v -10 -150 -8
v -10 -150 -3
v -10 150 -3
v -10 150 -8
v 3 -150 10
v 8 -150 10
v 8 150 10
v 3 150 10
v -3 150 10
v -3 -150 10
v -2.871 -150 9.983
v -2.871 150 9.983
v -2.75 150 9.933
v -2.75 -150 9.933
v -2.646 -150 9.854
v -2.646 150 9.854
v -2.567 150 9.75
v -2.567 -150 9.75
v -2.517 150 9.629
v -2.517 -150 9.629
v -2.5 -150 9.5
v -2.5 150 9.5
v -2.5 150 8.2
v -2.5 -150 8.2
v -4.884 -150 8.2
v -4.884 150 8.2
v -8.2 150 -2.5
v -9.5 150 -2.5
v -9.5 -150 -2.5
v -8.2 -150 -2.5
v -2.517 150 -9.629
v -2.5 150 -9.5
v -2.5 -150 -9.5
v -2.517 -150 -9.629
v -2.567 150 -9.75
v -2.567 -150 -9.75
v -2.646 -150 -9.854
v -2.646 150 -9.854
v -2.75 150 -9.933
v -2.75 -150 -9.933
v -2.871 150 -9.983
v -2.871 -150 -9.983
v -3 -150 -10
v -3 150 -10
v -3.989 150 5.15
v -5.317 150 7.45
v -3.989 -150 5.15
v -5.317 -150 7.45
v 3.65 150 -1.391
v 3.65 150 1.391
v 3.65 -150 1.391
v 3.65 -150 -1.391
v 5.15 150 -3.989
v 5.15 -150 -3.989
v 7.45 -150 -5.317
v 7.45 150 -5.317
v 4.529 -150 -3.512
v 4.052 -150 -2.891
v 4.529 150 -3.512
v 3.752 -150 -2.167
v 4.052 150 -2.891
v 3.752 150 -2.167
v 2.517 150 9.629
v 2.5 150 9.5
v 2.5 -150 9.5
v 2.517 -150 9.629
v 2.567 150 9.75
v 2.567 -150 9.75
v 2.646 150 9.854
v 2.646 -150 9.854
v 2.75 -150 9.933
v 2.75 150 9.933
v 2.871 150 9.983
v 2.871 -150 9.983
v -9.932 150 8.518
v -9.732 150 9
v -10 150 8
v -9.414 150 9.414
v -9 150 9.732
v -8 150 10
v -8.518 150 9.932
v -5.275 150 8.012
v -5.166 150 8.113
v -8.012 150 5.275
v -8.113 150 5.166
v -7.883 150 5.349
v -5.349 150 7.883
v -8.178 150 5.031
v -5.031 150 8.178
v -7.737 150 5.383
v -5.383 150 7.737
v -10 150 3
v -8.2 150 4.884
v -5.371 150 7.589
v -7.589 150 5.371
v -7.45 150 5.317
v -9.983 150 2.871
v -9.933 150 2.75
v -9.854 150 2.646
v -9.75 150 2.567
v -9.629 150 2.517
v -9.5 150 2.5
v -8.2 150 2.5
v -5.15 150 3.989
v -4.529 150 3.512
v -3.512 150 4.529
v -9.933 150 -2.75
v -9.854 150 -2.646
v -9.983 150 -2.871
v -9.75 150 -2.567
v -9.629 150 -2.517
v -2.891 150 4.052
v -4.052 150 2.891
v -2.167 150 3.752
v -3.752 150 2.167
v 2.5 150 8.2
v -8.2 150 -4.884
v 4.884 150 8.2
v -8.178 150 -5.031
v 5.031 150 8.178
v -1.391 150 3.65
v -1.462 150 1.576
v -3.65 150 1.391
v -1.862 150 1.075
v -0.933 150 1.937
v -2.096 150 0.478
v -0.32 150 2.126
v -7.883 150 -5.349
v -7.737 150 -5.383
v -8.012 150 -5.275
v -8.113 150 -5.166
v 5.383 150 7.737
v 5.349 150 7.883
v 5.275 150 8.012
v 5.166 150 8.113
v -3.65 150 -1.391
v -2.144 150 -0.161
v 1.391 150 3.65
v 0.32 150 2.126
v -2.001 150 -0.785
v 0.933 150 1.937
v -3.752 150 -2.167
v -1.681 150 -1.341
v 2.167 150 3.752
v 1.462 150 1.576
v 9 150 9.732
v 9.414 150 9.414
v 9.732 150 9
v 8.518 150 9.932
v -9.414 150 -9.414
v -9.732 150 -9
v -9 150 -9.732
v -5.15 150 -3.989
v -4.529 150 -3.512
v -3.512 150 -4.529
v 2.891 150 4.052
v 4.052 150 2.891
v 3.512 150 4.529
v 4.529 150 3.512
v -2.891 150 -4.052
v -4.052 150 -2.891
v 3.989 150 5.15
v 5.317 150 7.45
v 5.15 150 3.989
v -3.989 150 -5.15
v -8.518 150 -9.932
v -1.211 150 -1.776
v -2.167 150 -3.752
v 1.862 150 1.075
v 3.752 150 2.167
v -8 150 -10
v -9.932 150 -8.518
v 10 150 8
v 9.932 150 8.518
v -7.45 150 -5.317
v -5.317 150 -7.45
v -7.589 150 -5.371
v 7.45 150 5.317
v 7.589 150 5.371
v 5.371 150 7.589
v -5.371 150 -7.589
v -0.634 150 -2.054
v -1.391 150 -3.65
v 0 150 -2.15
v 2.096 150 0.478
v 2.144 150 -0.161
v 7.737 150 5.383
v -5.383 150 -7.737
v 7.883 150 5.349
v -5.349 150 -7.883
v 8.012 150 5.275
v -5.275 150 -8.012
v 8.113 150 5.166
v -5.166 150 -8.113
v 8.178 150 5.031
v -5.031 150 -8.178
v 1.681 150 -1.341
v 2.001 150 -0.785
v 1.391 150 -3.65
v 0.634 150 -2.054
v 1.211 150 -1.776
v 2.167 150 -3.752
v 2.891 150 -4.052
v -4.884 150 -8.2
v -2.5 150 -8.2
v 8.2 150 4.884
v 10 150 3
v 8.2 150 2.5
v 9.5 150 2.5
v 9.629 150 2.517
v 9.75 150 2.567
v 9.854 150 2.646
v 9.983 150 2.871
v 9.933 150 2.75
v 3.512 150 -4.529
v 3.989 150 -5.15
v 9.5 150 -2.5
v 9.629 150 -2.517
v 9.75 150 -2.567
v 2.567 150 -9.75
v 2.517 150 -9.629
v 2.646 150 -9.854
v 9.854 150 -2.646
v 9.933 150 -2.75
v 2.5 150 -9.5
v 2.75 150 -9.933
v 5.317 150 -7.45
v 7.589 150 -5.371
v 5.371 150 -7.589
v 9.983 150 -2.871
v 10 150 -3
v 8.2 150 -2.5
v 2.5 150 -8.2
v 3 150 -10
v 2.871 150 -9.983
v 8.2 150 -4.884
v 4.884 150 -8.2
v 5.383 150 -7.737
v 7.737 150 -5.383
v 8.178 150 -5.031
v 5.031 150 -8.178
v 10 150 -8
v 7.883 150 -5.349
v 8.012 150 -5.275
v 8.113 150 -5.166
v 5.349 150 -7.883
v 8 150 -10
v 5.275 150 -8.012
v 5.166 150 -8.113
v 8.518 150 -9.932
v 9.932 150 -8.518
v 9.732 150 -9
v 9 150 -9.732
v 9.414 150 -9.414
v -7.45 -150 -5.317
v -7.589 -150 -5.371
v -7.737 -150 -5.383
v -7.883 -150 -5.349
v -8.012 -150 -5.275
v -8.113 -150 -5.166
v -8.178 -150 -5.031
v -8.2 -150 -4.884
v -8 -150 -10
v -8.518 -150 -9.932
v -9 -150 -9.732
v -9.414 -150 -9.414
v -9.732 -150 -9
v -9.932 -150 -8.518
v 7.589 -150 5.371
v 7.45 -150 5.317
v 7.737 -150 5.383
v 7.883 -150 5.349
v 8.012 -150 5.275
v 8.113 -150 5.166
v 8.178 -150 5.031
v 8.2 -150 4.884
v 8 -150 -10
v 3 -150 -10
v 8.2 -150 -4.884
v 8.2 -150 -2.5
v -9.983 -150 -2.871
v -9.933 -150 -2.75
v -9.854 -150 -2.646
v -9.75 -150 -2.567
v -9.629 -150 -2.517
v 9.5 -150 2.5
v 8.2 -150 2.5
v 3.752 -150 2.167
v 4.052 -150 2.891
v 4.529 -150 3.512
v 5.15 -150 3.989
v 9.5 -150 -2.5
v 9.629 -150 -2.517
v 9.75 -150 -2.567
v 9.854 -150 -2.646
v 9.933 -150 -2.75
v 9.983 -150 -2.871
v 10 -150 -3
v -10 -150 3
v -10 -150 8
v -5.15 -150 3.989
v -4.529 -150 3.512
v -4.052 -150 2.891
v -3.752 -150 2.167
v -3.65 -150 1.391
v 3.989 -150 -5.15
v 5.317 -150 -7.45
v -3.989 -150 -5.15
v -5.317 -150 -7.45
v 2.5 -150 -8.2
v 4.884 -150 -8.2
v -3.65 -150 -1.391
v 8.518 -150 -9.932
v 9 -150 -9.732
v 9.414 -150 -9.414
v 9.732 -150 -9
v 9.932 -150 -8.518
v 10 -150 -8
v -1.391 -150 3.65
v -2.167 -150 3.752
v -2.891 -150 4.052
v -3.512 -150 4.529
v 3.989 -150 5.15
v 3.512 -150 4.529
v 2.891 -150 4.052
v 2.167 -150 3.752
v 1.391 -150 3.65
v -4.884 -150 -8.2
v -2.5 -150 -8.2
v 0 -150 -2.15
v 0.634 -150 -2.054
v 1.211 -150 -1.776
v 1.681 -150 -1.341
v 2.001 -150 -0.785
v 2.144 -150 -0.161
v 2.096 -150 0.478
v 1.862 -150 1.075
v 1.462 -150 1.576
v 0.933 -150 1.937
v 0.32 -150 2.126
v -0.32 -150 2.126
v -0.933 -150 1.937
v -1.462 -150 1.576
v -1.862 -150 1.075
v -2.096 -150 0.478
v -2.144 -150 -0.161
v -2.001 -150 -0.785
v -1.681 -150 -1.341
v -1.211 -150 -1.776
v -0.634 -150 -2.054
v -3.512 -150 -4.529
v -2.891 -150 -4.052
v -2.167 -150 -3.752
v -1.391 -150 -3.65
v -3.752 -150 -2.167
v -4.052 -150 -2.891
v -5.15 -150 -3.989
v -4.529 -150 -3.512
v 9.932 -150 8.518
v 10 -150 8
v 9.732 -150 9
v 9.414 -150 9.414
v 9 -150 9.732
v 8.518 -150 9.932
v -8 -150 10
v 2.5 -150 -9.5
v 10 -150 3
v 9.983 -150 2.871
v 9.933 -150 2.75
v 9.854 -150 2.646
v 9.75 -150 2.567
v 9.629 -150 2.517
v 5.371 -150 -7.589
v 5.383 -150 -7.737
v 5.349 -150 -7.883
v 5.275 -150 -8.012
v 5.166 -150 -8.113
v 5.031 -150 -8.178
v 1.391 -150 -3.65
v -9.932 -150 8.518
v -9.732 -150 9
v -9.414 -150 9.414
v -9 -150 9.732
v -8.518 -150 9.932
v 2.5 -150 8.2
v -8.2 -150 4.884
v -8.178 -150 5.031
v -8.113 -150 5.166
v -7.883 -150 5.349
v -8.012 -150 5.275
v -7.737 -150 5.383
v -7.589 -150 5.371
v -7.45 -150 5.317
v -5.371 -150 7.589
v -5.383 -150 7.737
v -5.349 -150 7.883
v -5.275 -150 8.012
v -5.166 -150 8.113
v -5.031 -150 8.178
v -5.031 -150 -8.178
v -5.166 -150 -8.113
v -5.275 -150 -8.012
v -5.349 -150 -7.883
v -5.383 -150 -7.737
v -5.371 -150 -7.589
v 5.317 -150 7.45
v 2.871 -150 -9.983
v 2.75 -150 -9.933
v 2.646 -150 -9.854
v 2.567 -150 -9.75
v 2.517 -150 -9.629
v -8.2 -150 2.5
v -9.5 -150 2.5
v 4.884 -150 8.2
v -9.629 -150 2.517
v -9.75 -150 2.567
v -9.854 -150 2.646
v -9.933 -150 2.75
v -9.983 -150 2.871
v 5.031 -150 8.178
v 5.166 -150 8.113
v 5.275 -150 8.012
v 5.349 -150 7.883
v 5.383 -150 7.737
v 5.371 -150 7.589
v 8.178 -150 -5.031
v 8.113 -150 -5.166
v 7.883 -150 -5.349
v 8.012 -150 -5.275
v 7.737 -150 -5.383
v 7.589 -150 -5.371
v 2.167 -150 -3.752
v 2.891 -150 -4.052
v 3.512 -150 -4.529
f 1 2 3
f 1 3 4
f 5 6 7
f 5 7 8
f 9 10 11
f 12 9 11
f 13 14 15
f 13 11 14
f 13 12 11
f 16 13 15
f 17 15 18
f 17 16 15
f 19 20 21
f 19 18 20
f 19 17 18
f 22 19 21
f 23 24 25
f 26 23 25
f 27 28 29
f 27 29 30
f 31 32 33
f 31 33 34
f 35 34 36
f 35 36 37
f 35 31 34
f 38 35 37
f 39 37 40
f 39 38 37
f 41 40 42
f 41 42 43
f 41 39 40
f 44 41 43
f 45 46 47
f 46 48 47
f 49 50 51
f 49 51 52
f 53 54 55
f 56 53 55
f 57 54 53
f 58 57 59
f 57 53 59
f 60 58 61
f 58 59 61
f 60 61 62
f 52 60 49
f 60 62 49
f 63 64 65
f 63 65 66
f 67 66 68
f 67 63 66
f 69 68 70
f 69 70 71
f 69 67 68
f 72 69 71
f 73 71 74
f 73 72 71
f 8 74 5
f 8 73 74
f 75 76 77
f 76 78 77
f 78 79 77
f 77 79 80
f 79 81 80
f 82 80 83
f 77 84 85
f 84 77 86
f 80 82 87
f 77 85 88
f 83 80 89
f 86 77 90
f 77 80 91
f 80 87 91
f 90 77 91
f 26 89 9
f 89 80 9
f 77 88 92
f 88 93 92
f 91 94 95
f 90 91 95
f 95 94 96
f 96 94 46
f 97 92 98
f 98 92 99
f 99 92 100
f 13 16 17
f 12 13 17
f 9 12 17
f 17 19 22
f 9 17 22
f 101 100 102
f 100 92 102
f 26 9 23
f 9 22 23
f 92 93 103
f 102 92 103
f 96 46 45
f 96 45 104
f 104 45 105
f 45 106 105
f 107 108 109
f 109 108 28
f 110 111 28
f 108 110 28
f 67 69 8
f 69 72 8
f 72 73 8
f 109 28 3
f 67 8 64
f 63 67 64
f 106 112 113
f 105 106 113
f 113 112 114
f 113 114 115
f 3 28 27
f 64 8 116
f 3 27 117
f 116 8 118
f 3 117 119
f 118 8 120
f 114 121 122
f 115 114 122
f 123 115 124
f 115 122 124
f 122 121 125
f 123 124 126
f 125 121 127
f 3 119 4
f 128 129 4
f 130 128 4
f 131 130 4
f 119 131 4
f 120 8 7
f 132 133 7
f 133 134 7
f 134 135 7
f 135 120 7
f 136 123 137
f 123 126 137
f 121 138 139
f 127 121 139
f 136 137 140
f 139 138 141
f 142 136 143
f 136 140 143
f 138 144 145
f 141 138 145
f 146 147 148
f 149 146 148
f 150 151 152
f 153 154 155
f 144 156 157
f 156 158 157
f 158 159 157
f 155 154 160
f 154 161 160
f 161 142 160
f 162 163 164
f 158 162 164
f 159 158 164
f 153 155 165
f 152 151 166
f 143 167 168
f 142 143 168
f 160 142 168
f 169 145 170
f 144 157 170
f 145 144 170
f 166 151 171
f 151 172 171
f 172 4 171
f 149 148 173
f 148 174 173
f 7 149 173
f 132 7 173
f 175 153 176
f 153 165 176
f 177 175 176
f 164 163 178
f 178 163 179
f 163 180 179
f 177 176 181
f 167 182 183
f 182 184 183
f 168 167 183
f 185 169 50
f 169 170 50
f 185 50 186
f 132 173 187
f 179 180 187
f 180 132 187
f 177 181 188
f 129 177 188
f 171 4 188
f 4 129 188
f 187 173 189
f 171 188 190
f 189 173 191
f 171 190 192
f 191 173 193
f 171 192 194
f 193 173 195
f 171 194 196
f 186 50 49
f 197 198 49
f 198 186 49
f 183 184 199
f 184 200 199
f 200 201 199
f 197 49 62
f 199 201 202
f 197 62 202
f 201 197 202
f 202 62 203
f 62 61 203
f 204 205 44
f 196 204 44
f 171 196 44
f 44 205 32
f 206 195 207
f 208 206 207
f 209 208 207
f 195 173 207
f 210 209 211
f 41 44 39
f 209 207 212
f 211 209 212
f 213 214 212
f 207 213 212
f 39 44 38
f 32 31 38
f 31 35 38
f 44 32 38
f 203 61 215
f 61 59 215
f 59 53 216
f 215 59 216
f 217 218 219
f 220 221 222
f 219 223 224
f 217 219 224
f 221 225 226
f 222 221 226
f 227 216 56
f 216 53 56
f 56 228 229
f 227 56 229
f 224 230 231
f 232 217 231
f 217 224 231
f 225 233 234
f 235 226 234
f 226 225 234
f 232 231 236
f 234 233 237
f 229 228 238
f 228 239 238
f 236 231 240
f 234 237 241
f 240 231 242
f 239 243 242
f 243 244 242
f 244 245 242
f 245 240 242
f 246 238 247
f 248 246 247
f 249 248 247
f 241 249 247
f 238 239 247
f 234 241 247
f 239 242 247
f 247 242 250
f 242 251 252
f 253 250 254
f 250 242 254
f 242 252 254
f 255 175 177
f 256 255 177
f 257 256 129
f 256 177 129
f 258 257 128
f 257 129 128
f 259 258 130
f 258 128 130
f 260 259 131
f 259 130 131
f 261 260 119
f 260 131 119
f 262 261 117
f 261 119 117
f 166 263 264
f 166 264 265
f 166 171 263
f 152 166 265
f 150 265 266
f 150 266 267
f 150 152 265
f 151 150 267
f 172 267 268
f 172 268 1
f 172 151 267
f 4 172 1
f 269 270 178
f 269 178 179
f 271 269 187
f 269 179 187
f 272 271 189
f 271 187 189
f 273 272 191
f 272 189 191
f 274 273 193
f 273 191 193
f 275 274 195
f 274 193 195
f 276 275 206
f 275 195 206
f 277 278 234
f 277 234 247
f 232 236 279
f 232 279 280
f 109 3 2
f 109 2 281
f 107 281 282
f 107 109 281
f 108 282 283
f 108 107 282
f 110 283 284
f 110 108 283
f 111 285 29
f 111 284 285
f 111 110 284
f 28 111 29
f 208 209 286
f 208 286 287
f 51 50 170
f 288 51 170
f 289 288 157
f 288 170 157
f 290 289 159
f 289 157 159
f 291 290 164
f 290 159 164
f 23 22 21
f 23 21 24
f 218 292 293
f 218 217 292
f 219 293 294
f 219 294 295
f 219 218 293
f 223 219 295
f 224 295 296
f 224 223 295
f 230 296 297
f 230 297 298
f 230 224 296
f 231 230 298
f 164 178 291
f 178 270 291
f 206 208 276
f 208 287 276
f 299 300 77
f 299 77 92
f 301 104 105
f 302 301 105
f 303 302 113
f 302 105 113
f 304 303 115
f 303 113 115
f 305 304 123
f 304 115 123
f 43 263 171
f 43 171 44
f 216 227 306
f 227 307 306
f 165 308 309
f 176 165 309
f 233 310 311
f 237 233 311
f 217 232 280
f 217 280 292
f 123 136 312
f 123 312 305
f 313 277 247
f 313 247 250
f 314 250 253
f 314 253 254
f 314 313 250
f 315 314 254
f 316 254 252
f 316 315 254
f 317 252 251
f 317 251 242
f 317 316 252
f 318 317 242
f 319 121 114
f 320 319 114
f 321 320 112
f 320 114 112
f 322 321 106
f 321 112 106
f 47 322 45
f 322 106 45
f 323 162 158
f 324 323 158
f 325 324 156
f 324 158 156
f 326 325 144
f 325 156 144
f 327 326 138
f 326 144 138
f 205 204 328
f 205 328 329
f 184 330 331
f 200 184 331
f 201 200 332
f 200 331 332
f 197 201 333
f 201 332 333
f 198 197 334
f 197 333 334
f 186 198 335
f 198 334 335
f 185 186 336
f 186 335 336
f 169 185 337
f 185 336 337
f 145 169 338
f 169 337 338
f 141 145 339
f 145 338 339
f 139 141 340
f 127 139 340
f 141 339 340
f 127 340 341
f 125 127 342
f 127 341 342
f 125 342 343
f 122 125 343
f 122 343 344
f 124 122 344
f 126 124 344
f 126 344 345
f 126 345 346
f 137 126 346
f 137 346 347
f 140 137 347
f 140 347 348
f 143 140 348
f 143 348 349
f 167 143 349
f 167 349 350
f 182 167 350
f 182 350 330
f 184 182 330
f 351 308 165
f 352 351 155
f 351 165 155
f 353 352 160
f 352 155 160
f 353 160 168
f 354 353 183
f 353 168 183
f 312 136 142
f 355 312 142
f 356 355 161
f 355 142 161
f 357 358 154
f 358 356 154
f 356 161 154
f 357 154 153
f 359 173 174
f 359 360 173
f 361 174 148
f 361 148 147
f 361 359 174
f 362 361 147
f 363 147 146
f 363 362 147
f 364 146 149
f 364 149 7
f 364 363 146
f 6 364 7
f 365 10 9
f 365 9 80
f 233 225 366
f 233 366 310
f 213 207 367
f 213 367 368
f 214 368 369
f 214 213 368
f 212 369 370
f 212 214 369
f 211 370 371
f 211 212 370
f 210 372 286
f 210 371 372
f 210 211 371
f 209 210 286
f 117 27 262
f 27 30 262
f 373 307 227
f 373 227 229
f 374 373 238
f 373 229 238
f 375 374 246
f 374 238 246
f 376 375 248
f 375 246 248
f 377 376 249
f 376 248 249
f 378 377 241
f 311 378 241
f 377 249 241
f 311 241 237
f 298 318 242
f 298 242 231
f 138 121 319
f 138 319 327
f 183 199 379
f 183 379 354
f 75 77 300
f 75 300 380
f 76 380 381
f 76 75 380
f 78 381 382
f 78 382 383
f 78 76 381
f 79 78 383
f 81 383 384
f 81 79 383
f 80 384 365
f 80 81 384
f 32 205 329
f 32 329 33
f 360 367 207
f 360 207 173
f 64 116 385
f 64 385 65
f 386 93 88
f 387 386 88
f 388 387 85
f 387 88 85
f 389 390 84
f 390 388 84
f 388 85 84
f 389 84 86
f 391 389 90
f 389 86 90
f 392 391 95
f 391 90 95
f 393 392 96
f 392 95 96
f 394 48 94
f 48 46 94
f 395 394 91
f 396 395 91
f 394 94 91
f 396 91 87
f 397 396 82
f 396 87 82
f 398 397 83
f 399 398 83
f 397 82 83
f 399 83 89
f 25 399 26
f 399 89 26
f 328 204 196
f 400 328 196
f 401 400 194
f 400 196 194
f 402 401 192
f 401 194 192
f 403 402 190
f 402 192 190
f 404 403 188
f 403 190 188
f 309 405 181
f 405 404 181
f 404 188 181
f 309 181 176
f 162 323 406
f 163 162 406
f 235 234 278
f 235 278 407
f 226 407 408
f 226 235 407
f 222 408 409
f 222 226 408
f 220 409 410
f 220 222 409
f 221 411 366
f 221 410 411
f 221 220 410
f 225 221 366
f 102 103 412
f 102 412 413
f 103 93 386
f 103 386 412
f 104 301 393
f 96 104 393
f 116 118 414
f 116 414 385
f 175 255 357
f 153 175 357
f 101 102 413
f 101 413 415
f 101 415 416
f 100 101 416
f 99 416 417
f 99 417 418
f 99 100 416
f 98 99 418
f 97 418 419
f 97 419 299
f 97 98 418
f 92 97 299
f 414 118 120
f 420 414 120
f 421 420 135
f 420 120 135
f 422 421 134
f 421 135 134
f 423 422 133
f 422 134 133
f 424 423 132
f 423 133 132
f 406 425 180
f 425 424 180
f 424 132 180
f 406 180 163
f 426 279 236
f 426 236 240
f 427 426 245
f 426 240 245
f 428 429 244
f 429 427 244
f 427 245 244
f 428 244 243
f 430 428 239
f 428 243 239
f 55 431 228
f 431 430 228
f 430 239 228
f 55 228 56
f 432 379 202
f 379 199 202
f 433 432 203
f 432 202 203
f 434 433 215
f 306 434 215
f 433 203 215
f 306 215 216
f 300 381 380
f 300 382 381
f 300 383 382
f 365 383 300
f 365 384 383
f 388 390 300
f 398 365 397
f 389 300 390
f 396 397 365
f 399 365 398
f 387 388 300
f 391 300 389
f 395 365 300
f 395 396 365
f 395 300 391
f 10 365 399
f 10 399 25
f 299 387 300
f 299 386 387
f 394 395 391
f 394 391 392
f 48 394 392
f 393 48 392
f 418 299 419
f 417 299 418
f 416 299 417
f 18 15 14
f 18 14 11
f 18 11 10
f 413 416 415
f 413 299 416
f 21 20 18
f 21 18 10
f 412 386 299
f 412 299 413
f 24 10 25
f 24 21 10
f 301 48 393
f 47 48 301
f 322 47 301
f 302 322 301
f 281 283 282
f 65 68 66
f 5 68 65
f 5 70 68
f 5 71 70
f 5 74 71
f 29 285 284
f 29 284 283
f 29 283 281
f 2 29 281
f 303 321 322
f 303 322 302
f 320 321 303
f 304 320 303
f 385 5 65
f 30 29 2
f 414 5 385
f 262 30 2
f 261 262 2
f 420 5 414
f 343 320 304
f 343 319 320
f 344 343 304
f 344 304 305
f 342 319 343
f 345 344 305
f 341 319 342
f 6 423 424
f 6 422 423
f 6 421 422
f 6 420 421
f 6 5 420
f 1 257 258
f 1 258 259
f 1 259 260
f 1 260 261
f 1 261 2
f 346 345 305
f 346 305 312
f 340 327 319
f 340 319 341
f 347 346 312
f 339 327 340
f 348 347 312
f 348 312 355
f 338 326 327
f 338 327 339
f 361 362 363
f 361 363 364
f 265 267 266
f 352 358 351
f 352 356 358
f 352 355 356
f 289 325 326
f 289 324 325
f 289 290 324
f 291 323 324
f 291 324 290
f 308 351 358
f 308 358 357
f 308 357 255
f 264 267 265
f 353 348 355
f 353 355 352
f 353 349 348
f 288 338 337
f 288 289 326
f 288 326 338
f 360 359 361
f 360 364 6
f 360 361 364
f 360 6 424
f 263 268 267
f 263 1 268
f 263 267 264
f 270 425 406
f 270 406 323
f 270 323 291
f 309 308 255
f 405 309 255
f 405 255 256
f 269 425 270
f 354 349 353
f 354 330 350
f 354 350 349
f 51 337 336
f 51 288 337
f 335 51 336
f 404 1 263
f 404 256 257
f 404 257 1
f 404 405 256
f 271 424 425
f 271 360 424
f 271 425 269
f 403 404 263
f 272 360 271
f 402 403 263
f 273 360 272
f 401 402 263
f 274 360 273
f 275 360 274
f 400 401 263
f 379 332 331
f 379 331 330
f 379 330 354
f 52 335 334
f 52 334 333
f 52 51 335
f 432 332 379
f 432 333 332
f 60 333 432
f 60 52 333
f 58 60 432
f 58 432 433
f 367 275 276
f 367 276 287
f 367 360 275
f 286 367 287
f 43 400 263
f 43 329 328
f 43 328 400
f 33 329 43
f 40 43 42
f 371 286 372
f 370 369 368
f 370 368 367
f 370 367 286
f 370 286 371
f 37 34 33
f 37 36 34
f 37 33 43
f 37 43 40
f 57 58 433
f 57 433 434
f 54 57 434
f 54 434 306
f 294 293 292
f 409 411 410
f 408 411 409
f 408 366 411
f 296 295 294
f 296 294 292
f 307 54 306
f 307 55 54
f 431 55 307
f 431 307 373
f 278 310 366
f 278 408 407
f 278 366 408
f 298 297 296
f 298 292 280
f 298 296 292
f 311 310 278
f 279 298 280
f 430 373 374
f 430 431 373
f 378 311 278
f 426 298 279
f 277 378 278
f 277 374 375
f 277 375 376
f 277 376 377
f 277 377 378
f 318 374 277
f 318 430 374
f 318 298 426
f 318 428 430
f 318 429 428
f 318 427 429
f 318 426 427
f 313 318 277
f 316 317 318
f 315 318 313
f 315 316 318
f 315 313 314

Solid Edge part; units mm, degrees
sketch "Sketch1" plane through (0, 0, 0) normal (0, -1, 0) x (1, 0, 0)
  line L0 (-10, -10) -> (10, -10)
  line L1 (10, -10) -> (10, 10)
  line L2 (10, 10) -> (-10, 10)
  line L3 (-10, 10) -> (-10, -10)
  dimension "D1" = 20
  dimension "D2" = 20
extrude "Protrusion1" add sketch "Sketch1" along normal mid plane 300
sketch "Sketch2" plane through (0, -150, 0) normal (0, -1, 0) x (1, 0, 0)
  line L0 (-2.5, 10) -> (-2.5, 8.2)
  line L1 (-2.5, 8.2) -> (-5.75, 8.2)
  line L2 (-5.75, 8.2) -> (-3.1231, 3.65)
  line L3 (-3.1231, 3.65) -> (3.1231, 3.65)
  line L4 (3.1231, 3.65) -> (5.75, 8.2)
  line L5 (5.75, 8.2) -> (2.5, 8.2)
  line L6 (2.5, 8.2) -> (2.5, 10)
  line L7 (2.5, 10) -> (-2.5, 10)
  dimension "D1" = 11.5
  dimension "D2" = 1.8
  dimension "D3" = 5
  dimension "D4" = 6.35
extrude "Cutout1" cut sketch "Sketch2" against normal through all
fillet "Verrundung_1" radius 2 4 edges at (10, 0, 10) (-10, 0, 10) (10, 0, -10) (-10, 0, -10)
fillet "Verrundung_2" radius 3 2 edges at (-3.1231, 0, 3.65) (3.1231, 0, 3.65)
fillet "Verrundung_3" radius 0.5 4 edges at (-5.75, 0, 8.2) (5.75, 0, 8.2) (-2.5, 0, 10) (2.5, 0, 10)
hole "Bohrung_1" at (0, -150, 0) direction (0, 1, 0) diameter 4.3 end up to next
pattern_circular "Pattern1" count 4 over 360 about axis through (0, -150, 0) along (0, -1, 0) of "Cutout1"
fillet "Round1" radius 3 2 edges at (-3.65, 0, -3.1231) (-3.65, 0, 3.1231)
fillet "Round2" radius 0.5 4 edges at (-8.2, 0, -5.75) (-8.2, 0, 5.75) (-10, 0, -2.5) (-10, 0, 2.5)
fillet "Round3" radius 3 2 edges at (3.1231, 0, -3.65) (-3.1231, 0, -3.65)
fillet "Round4" radius 0.5 4 edges at (5.75, 0, -8.2) (-5.75, 0, -8.2) (2.5, 0, -10) (-2.5, 0, -10)
fillet "Round5" radius 3 2 edges at (3.65, 0, 3.1231) (3.65, 0, -3.1231)
fillet "Round6" radius 0.5 4 edges at (8.2, 0, 5.75) (8.2, 0, -5.75) (10, 0, 2.5) (10, 0, -2.5)
